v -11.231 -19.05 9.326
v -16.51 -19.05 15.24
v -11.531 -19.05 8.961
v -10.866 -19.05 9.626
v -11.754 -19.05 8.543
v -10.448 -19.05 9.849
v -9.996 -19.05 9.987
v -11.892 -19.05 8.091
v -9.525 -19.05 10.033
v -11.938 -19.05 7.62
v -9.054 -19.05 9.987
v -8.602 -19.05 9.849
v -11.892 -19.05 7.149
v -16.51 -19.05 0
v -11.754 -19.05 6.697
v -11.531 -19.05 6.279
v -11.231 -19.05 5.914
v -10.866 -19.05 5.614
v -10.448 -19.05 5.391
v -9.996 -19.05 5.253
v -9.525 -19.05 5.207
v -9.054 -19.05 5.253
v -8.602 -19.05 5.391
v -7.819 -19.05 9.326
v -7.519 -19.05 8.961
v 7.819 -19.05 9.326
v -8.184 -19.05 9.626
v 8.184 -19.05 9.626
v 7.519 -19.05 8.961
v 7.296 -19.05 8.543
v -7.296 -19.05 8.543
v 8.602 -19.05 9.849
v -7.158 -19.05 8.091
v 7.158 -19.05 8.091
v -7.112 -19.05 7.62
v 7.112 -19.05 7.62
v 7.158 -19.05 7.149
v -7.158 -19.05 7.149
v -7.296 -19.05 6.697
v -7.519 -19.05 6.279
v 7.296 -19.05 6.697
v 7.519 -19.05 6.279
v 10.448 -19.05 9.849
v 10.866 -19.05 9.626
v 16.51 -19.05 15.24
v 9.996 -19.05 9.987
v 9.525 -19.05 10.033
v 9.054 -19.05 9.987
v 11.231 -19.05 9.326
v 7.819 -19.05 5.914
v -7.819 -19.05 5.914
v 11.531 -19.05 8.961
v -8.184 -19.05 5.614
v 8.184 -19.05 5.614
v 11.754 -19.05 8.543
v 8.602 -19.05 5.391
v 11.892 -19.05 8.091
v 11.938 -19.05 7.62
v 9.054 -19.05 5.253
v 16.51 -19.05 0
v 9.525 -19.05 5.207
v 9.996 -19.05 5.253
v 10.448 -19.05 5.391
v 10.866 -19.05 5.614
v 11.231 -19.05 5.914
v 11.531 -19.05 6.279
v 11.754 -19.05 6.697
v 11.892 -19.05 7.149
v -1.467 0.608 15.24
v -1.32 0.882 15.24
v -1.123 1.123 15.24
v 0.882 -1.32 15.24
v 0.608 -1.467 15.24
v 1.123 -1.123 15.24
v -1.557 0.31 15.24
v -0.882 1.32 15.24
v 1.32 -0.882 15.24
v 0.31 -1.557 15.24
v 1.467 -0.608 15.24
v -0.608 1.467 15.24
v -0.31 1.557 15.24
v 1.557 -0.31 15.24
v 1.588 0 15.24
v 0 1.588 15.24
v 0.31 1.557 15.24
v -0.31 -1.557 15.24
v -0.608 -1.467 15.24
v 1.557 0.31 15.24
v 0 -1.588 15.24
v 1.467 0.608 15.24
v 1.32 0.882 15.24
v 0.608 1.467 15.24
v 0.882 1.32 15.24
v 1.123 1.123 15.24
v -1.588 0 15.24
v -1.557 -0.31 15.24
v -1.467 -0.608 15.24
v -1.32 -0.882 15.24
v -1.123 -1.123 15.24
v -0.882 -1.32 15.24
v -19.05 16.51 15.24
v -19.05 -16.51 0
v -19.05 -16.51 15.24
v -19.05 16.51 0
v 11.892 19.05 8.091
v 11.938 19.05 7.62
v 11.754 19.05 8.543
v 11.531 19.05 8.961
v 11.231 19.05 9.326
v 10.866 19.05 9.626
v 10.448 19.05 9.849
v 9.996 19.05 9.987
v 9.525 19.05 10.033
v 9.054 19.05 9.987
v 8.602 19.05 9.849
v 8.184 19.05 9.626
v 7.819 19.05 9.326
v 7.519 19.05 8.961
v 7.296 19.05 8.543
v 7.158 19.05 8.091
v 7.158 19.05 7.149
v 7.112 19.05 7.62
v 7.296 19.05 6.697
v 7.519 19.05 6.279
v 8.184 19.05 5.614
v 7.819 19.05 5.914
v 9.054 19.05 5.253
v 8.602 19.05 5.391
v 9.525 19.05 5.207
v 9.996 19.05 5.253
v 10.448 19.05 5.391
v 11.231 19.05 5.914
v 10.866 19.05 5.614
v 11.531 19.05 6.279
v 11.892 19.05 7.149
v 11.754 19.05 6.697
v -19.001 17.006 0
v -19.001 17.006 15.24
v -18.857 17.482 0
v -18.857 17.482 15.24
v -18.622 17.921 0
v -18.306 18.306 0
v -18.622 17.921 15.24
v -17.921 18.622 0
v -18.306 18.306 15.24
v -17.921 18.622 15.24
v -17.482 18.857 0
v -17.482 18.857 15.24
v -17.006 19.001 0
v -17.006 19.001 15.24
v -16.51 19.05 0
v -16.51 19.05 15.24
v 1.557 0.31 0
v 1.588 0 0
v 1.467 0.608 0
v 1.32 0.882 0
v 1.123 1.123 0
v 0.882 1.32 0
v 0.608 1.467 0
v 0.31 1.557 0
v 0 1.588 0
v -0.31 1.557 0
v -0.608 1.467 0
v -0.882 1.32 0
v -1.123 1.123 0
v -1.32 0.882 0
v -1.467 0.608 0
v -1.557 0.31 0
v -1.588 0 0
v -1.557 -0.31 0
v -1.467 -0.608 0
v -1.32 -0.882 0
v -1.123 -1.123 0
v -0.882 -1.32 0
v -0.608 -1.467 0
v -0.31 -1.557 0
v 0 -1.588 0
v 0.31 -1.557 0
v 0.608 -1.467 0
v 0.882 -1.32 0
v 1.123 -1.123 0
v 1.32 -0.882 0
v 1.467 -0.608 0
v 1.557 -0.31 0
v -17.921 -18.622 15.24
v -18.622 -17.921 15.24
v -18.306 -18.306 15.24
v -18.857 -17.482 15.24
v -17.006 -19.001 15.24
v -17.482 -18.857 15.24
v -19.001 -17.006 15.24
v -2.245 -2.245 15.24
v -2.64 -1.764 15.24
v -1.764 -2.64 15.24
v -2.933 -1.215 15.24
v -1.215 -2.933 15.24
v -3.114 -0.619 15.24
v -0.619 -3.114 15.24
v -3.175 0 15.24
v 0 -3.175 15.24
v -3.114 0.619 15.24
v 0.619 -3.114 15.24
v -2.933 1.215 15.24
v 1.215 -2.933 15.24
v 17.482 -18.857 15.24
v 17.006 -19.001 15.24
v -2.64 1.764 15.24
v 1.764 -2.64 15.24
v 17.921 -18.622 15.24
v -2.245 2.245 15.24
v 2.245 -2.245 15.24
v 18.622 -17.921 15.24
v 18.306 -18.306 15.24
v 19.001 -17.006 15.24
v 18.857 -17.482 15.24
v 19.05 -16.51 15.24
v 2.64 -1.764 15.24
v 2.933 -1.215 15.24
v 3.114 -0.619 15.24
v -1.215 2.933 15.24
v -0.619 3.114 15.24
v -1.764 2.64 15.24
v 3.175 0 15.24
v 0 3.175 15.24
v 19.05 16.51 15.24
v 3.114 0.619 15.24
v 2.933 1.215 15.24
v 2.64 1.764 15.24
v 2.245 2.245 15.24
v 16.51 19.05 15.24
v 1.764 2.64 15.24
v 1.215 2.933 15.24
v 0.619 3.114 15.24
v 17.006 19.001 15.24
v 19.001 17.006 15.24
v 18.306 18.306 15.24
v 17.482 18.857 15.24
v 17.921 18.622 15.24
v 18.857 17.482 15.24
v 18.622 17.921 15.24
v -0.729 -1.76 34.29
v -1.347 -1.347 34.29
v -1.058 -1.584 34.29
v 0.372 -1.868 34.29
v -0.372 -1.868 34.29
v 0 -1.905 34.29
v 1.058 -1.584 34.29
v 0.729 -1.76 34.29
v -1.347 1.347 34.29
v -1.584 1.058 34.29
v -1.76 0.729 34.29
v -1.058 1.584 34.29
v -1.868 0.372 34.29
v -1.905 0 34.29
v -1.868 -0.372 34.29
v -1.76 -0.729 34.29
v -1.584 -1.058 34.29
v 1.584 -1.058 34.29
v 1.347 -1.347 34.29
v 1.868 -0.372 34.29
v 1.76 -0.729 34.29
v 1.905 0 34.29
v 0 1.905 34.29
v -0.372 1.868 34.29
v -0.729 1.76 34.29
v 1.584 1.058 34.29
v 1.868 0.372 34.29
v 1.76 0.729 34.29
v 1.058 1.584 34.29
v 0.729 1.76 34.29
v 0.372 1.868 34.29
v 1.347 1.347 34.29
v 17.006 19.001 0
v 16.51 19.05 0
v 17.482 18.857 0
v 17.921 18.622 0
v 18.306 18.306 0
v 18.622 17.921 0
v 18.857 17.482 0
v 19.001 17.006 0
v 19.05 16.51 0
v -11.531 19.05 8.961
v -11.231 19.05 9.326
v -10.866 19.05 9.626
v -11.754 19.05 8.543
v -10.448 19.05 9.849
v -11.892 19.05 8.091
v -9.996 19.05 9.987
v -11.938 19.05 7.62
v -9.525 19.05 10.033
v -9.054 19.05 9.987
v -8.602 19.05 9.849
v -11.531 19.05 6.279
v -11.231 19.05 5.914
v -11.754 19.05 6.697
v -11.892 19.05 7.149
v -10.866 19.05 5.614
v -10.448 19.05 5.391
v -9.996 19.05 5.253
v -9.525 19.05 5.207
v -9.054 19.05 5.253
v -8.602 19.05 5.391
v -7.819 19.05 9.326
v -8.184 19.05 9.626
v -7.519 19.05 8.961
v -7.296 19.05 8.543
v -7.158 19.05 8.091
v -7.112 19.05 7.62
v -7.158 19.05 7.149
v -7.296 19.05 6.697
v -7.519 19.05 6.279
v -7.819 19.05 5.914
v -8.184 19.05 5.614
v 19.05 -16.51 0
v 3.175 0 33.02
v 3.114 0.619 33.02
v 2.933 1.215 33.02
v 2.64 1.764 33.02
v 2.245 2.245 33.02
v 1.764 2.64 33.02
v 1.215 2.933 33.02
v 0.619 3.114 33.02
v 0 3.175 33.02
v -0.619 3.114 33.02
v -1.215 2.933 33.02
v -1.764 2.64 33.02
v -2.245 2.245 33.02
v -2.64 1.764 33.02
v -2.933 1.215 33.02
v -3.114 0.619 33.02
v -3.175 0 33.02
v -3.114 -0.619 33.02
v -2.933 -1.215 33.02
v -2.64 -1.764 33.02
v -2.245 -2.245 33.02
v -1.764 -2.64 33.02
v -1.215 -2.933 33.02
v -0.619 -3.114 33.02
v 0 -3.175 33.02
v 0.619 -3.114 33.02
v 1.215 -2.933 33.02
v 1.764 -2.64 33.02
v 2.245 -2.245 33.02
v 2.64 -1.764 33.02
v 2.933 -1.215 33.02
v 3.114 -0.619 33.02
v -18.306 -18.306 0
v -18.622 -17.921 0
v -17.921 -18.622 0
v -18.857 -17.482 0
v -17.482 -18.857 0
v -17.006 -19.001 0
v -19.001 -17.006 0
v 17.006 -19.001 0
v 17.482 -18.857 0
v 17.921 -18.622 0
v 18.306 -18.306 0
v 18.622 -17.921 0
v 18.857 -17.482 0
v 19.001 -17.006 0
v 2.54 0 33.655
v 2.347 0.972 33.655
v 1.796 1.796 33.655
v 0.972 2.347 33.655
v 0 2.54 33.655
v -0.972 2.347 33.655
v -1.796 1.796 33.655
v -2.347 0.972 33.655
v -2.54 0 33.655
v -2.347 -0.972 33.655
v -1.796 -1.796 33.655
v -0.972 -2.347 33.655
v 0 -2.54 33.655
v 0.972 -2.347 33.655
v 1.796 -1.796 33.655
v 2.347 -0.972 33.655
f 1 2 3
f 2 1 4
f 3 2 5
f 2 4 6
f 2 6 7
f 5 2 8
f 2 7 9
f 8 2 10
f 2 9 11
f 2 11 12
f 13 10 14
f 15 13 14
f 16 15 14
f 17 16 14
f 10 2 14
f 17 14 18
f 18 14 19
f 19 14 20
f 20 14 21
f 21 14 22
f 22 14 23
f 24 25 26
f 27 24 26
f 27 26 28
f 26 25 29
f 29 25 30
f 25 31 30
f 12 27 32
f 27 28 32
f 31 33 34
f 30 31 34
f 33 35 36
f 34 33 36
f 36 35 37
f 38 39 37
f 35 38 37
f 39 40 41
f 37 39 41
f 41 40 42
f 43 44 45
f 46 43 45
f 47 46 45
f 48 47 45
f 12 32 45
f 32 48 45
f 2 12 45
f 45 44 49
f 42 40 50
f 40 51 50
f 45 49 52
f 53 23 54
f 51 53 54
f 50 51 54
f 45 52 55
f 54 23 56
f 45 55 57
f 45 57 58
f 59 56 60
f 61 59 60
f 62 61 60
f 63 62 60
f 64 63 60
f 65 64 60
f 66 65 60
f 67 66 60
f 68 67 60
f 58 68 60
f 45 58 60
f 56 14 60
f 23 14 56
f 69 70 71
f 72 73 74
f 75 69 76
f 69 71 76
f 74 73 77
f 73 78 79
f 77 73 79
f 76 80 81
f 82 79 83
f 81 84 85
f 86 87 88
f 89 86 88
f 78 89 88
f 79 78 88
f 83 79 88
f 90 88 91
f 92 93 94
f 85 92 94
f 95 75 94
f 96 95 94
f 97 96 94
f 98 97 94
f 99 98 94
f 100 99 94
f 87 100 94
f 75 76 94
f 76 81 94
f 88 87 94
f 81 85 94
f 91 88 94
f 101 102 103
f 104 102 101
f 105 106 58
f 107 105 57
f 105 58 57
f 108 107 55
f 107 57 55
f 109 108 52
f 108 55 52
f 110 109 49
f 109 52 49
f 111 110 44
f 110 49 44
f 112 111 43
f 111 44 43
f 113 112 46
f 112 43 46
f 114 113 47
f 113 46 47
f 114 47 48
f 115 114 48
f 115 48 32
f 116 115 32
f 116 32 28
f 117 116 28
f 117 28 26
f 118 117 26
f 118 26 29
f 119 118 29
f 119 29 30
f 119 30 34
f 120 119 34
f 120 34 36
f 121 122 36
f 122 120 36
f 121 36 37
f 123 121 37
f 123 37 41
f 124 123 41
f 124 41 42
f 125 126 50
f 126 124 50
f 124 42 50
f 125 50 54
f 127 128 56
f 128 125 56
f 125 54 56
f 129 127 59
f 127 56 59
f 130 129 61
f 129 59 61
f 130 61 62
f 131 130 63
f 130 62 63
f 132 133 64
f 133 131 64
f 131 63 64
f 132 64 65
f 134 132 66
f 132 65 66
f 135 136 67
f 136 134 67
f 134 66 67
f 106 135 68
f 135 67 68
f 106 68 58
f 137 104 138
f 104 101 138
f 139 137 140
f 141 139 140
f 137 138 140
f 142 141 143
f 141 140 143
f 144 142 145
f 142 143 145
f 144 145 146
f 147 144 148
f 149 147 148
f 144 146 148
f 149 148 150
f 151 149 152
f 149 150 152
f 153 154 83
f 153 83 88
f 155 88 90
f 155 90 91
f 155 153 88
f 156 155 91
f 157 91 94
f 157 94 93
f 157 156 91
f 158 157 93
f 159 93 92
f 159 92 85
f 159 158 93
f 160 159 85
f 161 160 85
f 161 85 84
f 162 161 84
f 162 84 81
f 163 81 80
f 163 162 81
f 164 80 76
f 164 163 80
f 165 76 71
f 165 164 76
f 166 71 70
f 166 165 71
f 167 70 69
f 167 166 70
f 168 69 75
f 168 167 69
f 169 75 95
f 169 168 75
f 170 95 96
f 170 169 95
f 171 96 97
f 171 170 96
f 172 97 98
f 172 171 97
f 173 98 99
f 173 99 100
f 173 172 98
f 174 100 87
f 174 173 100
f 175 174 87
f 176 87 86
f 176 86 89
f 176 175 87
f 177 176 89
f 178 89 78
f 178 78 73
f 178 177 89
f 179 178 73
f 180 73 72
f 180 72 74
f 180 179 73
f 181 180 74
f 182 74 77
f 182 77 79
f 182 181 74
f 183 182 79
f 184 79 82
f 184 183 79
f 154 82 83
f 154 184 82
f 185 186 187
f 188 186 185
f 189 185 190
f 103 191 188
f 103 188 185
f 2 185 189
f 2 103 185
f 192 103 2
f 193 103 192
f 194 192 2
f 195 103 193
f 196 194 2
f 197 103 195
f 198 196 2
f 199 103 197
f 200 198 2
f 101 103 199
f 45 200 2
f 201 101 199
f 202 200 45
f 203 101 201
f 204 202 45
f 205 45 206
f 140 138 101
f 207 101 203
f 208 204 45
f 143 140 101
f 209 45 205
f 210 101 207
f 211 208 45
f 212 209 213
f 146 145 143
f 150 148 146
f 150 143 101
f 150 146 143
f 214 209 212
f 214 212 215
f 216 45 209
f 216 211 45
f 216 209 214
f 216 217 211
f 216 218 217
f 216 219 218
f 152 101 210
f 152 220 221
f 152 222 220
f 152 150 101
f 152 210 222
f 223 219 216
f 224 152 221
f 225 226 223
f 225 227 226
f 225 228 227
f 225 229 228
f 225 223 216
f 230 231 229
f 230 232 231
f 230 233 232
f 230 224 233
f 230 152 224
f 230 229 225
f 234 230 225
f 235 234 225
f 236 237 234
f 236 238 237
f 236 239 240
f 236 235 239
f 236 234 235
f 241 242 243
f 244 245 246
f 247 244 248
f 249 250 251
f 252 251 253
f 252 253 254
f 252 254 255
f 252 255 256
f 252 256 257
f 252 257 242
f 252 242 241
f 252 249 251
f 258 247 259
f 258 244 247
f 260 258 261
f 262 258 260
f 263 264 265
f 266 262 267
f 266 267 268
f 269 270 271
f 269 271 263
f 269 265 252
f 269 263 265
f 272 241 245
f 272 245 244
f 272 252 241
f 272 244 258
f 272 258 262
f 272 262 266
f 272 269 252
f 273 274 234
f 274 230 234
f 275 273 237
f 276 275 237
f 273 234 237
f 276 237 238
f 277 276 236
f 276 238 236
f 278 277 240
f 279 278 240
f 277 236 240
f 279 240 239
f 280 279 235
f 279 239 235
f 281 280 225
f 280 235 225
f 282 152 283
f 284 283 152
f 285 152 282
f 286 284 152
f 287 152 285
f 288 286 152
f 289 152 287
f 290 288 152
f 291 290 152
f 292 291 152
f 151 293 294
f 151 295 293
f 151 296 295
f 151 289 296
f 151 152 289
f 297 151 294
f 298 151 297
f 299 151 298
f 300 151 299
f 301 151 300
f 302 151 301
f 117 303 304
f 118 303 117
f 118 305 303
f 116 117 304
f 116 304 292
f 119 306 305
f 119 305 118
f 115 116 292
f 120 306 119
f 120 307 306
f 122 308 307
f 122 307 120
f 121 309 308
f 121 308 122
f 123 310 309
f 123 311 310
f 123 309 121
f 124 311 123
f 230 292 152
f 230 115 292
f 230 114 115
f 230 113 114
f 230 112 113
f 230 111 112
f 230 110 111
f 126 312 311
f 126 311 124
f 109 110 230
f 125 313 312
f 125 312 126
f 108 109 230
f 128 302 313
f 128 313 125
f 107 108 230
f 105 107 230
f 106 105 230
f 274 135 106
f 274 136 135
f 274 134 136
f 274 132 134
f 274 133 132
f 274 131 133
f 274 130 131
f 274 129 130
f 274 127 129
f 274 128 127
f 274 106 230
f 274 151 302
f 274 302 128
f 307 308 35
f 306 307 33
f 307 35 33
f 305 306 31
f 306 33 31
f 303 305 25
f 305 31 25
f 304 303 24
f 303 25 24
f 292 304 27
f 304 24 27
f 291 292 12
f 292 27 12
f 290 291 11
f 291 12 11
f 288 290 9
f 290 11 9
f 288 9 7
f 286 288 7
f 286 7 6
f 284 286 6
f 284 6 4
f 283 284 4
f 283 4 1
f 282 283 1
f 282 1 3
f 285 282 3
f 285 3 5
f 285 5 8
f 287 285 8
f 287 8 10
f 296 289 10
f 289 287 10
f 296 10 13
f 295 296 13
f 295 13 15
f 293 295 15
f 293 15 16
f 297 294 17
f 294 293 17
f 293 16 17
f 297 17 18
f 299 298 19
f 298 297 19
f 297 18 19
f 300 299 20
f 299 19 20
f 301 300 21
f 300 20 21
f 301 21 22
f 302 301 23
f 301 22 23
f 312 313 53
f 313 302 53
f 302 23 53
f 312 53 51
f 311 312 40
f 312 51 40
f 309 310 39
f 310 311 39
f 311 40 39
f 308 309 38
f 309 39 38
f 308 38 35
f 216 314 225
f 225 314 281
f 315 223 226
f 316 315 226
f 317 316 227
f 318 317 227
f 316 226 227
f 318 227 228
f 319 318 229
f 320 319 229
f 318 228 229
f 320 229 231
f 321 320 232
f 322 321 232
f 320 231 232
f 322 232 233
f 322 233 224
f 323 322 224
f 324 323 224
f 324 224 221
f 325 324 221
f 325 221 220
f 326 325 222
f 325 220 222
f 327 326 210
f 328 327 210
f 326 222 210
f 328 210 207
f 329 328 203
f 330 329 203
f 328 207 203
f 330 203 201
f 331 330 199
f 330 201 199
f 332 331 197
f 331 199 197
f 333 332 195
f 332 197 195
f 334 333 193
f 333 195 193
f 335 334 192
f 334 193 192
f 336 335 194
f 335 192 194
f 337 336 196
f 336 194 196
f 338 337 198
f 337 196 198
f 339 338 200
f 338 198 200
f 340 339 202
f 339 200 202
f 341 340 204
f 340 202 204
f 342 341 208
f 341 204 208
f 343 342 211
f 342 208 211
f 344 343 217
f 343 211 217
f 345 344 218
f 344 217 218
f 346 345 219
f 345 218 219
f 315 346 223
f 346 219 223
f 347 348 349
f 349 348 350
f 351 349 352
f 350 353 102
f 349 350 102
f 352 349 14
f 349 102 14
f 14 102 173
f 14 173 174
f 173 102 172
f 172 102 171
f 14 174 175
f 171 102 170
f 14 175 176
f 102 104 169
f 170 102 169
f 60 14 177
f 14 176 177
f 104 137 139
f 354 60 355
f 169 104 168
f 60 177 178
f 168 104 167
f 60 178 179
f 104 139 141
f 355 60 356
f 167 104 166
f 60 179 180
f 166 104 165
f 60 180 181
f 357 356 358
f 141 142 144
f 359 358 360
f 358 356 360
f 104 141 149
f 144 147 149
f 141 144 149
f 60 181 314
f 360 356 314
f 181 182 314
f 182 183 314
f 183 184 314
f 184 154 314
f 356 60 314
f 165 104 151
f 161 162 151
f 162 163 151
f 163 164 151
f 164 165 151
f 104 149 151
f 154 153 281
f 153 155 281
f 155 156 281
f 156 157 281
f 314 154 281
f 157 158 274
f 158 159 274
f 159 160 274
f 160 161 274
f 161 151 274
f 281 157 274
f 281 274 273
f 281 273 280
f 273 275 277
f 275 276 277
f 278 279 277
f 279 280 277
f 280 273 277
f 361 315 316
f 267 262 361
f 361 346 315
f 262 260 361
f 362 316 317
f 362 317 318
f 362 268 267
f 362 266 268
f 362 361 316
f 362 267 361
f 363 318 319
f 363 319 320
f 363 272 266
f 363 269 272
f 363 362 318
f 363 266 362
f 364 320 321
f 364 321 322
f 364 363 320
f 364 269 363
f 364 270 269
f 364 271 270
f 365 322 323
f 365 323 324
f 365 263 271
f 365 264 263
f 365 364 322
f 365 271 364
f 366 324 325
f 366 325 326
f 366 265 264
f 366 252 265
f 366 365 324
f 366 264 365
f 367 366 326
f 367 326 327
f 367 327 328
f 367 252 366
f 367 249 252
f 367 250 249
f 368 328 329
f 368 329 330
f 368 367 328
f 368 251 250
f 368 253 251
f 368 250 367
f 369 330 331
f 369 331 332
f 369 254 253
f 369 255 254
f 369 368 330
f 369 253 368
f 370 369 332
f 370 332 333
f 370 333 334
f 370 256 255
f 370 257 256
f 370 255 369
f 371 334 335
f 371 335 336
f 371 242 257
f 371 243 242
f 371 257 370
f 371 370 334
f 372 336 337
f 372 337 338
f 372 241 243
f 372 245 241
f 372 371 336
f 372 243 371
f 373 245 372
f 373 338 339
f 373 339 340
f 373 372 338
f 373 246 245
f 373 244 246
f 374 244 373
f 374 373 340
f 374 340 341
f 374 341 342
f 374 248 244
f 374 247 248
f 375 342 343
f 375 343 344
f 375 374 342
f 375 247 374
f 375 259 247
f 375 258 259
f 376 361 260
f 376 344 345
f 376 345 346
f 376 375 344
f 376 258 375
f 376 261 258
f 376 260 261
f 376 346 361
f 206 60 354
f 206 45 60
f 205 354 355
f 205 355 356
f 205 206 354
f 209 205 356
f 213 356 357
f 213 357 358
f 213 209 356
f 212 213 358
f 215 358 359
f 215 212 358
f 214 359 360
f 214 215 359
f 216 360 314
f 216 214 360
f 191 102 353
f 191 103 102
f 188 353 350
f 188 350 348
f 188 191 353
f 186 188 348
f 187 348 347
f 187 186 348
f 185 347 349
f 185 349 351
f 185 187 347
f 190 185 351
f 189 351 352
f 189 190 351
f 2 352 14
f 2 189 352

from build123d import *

# Parameters (mm, degrees)
SKETCH1_W           = 38.1
SKETCH1_H           = 38.1
SKETCH1_R           = 1.5875
BOSS_EXTRUDE2_DEPTH = 15.24
SKETCH3_R           = 3.175
BOSS_EXTRUDE3_DEPTH = 19.05
FILLET2_R           = 2.54
CHAMFER1_SIZE       = 1.27
SKETCH4_R           = 2.413
CUT_EXTRUDE2_DEPTH  = 7.62
SKETCH5_R           = 2.413
CUT_EXTRUDE3_DEPTH  = 7.62
SKETCH6_R           = 2.413
CUT_EXTRUDE4_DEPTH  = 39.1


with BuildPart() as part:
    # Sketch1 → Boss-Extrude2 (new body)
    with BuildSketch(Plane.XY):
        Rectangle(SKETCH1_W, SKETCH1_H)
        Circle(SKETCH1_R, mode=Mode.SUBTRACT)
    extrude(amount=BOSS_EXTRUDE2_DEPTH)

    # Sketch3 → Boss-Extrude3 (add)
    with BuildSketch(Plane.XY.offset(15.24)):
        Circle(SKETCH3_R)
    extrude(amount=BOSS_EXTRUDE3_DEPTH)

    # Fillet2
    fillet2_edges = [part.edges().sort_by_distance(p)[0] for p in [
        (-19.05, 19.05, 7.62),
        (19.05, 19.05, 7.62),
        (19.05, -19.05, 7.62),
        (-19.05, -19.05, 7.62),
    ]]
    fillet(fillet2_edges, radius=FILLET2_R)

    # Chamfer1
    chamfer1_edges = [part.edges().sort_by_distance(p)[0] for p in [
        (-3.175, 0, 34.29),
    ]]
    chamfer(chamfer1_edges, length=CHAMFER1_SIZE)

    # Sketch4 → Cut-Extrude2 (cut)
    with BuildSketch(Plane.XZ.offset(19.05)):
        with Locations((-9.525, 7.62)):
            Circle(SKETCH4_R)
        with Locations((9.525, 7.62)):
            Circle(SKETCH4_R)
    extrude(amount=-CUT_EXTRUDE2_DEPTH, mode=Mode.SUBTRACT)

    # Sketch5 → Cut-Extrude3 (cut)
    with BuildSketch(Plane(origin=(0, 19.05, 0), x_dir=(1, 0, 0), z_dir=(0, 1, 0))):
        with Locations((9.525, -7.62)):
            Circle(SKETCH5_R)
        with Locations((-9.525, -7.62)):
            Circle(SKETCH5_R)
    extrude(amount=-CUT_EXTRUDE3_DEPTH, mode=Mode.SUBTRACT)

    # Sketch6 → Cut-Extrude4 (cut, through all)
    with BuildSketch(Plane(origin=(0, 19.05, 0), x_dir=(1, 0, 0), z_dir=(0, 1, 0))):
        with Locations((9.525, -7.62)):
            Circle(SKETCH6_R)
        with Locations((-9.525, -7.62)):
            Circle(SKETCH6_R)
    extrude(amount=-CUT_EXTRUDE4_DEPTH, mode=Mode.SUBTRACT)


solid = part.part
